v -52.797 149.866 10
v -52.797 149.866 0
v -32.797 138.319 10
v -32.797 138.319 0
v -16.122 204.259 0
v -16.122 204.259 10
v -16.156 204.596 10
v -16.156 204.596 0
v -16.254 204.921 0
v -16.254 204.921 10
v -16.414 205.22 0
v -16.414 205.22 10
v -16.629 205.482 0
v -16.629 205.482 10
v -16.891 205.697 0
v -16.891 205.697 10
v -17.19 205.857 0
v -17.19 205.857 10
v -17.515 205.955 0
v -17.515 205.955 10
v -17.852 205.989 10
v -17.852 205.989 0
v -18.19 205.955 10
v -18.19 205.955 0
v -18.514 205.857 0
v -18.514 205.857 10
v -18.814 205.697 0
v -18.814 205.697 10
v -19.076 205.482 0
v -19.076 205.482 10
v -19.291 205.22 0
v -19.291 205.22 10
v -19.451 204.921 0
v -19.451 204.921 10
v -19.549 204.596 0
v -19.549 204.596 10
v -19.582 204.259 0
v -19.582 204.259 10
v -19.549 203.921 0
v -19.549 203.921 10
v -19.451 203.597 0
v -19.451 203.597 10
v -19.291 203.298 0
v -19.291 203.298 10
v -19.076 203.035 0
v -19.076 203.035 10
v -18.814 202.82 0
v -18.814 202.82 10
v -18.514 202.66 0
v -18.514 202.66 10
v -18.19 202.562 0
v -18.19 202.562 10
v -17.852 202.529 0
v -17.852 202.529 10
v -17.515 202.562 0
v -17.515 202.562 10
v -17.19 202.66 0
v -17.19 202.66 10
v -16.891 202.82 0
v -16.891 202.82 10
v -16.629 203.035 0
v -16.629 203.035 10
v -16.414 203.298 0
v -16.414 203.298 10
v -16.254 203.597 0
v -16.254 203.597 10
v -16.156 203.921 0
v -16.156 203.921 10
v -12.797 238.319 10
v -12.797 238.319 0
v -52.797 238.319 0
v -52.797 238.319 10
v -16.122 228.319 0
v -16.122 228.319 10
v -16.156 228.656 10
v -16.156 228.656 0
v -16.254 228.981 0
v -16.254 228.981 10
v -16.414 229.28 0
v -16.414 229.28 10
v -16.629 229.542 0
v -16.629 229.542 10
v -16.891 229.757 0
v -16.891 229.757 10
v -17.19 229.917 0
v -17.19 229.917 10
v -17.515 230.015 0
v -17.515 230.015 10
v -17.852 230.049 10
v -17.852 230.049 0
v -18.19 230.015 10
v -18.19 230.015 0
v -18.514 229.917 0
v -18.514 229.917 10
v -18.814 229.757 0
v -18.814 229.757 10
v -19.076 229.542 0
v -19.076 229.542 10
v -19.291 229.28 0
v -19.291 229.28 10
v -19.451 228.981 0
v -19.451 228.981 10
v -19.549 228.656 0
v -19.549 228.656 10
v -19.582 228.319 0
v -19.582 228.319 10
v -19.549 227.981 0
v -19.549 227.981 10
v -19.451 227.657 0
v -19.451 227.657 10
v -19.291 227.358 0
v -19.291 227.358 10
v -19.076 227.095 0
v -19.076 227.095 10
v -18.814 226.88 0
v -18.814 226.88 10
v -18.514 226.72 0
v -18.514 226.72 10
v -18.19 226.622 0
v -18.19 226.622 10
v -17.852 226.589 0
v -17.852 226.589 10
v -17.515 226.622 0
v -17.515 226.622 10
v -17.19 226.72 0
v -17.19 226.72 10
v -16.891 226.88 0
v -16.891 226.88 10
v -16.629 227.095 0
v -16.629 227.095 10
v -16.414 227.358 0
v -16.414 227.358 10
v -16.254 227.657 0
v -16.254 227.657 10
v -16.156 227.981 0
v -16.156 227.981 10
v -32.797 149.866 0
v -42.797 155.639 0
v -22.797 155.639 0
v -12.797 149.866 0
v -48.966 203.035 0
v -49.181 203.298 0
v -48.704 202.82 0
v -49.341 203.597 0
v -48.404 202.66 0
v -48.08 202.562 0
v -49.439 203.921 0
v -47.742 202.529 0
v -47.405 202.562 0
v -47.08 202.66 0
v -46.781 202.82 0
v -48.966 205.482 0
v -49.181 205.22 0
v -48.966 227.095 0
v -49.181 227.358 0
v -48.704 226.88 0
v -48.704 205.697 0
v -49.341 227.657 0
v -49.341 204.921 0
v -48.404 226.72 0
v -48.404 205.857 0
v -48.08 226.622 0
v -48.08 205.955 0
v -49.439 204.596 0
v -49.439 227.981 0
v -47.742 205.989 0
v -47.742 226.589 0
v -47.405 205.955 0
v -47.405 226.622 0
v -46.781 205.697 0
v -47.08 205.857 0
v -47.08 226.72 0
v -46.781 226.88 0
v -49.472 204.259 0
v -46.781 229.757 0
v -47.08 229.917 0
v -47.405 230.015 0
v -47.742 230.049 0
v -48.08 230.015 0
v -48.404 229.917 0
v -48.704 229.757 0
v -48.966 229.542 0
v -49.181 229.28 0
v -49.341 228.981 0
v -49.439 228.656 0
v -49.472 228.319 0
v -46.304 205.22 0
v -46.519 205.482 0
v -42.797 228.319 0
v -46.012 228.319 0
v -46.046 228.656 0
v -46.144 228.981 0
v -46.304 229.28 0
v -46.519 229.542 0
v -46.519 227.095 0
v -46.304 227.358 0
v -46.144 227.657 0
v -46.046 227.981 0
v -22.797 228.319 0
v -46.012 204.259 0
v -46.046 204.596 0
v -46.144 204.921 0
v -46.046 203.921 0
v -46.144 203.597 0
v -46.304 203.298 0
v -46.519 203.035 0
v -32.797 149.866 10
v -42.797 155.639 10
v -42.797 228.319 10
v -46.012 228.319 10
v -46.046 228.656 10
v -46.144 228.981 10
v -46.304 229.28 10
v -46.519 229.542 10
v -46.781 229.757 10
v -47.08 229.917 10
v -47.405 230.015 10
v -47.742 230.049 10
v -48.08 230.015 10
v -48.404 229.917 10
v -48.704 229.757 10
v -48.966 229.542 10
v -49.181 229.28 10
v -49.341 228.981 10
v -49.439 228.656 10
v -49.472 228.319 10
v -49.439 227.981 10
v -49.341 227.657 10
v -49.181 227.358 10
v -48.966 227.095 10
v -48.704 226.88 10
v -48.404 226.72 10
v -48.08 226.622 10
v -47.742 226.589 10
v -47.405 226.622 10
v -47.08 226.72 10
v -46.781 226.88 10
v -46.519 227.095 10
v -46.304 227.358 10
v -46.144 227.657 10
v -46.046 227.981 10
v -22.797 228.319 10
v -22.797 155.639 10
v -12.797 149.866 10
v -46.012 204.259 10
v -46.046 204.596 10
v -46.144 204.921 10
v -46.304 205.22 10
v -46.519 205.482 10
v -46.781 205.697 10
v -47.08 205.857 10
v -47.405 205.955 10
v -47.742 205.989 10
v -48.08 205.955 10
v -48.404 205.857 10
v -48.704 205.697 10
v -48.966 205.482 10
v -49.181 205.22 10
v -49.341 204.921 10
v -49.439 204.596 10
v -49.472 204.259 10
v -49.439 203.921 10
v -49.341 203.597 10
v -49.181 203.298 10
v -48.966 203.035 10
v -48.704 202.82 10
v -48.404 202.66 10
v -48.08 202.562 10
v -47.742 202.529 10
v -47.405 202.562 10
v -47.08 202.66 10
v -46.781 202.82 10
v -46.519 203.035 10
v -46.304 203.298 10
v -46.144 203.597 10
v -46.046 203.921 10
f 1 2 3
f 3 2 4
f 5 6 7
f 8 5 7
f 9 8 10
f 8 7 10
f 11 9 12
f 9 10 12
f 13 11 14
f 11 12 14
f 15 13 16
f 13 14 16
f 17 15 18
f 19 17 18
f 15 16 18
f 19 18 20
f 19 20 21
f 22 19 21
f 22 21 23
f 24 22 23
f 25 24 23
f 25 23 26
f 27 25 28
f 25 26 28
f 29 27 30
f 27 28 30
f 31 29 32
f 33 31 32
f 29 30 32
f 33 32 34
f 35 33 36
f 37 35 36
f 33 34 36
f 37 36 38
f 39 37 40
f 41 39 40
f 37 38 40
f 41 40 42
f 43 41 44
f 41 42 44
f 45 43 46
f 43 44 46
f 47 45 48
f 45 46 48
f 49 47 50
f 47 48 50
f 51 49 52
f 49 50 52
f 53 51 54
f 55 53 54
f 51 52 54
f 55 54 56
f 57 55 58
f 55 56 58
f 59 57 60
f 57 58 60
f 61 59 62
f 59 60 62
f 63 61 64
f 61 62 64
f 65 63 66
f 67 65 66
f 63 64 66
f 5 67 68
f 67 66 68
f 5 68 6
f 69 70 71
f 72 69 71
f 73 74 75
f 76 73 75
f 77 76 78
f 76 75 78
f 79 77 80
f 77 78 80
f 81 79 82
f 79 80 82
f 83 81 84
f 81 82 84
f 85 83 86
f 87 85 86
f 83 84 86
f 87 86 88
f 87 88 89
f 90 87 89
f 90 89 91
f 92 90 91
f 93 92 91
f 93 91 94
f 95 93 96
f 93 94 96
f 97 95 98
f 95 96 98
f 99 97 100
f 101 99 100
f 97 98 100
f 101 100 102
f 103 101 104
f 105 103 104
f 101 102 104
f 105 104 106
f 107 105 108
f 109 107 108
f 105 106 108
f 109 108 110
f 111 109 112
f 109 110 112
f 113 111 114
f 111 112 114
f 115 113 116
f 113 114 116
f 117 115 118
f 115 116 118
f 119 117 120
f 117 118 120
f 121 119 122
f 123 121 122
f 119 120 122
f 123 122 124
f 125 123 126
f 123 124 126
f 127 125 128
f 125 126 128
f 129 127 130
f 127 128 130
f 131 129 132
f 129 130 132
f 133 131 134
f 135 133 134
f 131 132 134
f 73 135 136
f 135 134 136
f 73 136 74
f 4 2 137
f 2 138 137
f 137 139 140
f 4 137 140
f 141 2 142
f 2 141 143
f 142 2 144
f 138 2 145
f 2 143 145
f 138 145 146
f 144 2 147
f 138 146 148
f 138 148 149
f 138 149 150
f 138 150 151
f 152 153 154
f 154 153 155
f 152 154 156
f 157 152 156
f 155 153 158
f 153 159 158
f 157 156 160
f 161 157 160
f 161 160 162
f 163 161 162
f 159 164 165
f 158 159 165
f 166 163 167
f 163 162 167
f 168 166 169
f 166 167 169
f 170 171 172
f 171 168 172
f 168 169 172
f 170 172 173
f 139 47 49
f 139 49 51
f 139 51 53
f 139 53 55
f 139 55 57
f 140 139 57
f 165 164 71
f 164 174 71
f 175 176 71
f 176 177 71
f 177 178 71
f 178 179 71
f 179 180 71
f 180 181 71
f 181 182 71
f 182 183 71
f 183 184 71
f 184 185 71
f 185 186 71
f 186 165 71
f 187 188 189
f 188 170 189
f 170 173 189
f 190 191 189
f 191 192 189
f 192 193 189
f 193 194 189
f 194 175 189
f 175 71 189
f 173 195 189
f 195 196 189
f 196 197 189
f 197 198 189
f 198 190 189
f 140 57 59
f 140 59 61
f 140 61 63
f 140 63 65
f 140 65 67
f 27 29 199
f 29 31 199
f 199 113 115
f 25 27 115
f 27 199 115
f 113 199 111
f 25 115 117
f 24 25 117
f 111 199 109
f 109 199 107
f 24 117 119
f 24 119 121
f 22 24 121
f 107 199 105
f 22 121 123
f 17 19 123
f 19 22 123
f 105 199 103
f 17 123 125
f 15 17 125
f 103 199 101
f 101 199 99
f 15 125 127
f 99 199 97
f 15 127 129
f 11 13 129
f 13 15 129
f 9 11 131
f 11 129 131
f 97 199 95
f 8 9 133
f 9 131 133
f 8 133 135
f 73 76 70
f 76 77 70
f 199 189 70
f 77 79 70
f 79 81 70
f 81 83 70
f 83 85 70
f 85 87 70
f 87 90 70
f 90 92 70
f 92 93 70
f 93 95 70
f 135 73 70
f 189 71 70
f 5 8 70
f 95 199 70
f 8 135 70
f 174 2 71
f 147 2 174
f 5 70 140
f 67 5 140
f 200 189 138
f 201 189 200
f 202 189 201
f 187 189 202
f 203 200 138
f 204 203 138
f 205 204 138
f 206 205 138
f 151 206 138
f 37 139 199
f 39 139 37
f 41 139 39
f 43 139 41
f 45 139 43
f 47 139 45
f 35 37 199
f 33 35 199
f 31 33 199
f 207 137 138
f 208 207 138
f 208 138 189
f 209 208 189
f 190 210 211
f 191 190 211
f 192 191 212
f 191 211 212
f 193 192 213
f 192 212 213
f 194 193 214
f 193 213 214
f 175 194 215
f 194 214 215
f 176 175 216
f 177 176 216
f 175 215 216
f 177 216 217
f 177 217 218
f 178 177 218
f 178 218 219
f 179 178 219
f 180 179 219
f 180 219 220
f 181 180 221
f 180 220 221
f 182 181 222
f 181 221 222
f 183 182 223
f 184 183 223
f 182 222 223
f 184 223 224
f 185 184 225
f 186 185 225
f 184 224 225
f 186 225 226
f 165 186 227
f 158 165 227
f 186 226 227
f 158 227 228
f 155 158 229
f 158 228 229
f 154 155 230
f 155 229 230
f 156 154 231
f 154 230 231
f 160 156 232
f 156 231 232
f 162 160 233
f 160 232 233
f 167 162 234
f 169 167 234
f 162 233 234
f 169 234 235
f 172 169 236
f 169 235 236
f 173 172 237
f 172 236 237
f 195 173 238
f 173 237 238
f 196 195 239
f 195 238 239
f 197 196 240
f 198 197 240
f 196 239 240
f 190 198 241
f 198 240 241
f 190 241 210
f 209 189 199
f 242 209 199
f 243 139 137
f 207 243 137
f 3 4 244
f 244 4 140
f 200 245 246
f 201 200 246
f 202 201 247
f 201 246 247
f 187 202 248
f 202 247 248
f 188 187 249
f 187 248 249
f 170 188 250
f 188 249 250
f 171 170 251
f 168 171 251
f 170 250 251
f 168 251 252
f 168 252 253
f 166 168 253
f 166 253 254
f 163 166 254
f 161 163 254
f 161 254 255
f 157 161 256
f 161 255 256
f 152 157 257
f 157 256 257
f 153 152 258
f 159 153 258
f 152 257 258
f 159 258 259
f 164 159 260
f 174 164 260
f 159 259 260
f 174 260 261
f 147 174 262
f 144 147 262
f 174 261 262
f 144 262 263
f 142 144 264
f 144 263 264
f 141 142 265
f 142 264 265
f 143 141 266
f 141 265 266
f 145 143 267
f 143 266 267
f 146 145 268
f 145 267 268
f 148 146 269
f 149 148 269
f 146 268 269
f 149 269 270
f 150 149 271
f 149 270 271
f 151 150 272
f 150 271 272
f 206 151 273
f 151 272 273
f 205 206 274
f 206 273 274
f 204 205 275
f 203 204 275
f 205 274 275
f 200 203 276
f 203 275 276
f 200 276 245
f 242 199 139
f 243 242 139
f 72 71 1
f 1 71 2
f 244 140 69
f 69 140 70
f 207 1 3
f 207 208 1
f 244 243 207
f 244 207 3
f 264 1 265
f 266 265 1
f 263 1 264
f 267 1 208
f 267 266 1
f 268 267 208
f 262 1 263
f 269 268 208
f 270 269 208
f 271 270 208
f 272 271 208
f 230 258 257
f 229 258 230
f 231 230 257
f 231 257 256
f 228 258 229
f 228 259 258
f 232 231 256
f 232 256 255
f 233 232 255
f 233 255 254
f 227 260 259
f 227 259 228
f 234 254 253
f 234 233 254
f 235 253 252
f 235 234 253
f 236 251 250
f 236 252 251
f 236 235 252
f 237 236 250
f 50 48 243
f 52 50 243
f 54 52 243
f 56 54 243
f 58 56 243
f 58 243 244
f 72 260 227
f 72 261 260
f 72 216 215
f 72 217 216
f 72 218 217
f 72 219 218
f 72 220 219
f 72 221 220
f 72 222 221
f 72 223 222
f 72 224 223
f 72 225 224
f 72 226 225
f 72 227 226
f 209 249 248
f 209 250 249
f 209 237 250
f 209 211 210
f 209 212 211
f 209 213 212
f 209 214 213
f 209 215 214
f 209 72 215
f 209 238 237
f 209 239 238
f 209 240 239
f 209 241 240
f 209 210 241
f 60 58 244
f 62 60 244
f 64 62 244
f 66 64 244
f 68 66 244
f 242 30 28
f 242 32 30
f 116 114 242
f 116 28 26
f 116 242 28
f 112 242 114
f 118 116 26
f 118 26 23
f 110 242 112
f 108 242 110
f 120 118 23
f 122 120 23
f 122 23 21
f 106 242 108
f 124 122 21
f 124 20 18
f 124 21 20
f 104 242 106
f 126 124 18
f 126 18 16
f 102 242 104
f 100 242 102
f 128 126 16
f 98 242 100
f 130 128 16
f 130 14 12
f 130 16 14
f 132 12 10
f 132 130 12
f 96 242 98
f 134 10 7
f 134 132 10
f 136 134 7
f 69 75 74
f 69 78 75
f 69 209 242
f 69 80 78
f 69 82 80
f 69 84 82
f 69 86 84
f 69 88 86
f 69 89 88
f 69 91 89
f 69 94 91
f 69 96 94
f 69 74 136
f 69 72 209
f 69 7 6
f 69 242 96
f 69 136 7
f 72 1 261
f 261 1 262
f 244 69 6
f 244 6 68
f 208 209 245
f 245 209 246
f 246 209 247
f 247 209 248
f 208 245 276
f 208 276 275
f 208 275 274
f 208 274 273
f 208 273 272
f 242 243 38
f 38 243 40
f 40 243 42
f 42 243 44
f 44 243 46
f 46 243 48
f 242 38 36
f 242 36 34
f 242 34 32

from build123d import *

# Parameters (mm, degrees)
BOSS_EXTRUDE1_DEPTH = 10
SKETCH3_R           = 1.73
CUT_EXTRUDE1_DEPTH  = 10


with BuildPart() as part:
    # Sketch1 → Boss-Extrude1 (new body)
    with BuildSketch(Plane.XY):
        Polygon((-12.797368251, 238.318722846), (-32.797368251, 238.318722846), (-32.797368251, 228.318722846), (-22.797368251, 228.318722846), (-22.797368251, 155.639230922), (-22.797368251, 144.092225538), (-12.797368251, 149.86572823), align=None)
        Polygon((-32.797368251, 228.318722846), (-32.797368251, 238.318722846), (-52.797368251, 238.318722846), (-52.797368251, 149.86572823), (-42.797368251, 144.092225538), (-42.797368251, 155.639230922), (-42.797368251, 228.318722846), align=None)
        Polygon((-32.797368251, 138.318722846), (-32.797368251, 149.86572823), (-37.797368251, 152.752479576), (-42.797368251, 155.639230922), (-42.797368251, 144.092225538), align=None)
        Polygon((-27.797368251, 152.752479576), (-32.797368251, 149.86572823), (-32.797368251, 138.318722846), (-22.797368251, 144.092225538), (-22.797368251, 155.639230922), align=None)
    extrude(amount=BOSS_EXTRUDE1_DEPTH)

    # Sketch3 → Cut-Extrude1 (cut)
    with BuildSketch(Plane.XY.offset(10)):
        with Locations((-47.742368251, 228.318722846)):
            Circle(SKETCH3_R)
        with Locations((-47.742368251, 204.258722846)):
            Circle(SKETCH3_R)
        with Locations((-17.852368251, 204.258722846)):
            Circle(SKETCH3_R)
        with Locations((-17.852368251, 228.318722846)):
            Circle(SKETCH3_R)
    extrude(amount=-CUT_EXTRUDE1_DEPTH, mode=Mode.SUBTRACT)


solid = part.part
